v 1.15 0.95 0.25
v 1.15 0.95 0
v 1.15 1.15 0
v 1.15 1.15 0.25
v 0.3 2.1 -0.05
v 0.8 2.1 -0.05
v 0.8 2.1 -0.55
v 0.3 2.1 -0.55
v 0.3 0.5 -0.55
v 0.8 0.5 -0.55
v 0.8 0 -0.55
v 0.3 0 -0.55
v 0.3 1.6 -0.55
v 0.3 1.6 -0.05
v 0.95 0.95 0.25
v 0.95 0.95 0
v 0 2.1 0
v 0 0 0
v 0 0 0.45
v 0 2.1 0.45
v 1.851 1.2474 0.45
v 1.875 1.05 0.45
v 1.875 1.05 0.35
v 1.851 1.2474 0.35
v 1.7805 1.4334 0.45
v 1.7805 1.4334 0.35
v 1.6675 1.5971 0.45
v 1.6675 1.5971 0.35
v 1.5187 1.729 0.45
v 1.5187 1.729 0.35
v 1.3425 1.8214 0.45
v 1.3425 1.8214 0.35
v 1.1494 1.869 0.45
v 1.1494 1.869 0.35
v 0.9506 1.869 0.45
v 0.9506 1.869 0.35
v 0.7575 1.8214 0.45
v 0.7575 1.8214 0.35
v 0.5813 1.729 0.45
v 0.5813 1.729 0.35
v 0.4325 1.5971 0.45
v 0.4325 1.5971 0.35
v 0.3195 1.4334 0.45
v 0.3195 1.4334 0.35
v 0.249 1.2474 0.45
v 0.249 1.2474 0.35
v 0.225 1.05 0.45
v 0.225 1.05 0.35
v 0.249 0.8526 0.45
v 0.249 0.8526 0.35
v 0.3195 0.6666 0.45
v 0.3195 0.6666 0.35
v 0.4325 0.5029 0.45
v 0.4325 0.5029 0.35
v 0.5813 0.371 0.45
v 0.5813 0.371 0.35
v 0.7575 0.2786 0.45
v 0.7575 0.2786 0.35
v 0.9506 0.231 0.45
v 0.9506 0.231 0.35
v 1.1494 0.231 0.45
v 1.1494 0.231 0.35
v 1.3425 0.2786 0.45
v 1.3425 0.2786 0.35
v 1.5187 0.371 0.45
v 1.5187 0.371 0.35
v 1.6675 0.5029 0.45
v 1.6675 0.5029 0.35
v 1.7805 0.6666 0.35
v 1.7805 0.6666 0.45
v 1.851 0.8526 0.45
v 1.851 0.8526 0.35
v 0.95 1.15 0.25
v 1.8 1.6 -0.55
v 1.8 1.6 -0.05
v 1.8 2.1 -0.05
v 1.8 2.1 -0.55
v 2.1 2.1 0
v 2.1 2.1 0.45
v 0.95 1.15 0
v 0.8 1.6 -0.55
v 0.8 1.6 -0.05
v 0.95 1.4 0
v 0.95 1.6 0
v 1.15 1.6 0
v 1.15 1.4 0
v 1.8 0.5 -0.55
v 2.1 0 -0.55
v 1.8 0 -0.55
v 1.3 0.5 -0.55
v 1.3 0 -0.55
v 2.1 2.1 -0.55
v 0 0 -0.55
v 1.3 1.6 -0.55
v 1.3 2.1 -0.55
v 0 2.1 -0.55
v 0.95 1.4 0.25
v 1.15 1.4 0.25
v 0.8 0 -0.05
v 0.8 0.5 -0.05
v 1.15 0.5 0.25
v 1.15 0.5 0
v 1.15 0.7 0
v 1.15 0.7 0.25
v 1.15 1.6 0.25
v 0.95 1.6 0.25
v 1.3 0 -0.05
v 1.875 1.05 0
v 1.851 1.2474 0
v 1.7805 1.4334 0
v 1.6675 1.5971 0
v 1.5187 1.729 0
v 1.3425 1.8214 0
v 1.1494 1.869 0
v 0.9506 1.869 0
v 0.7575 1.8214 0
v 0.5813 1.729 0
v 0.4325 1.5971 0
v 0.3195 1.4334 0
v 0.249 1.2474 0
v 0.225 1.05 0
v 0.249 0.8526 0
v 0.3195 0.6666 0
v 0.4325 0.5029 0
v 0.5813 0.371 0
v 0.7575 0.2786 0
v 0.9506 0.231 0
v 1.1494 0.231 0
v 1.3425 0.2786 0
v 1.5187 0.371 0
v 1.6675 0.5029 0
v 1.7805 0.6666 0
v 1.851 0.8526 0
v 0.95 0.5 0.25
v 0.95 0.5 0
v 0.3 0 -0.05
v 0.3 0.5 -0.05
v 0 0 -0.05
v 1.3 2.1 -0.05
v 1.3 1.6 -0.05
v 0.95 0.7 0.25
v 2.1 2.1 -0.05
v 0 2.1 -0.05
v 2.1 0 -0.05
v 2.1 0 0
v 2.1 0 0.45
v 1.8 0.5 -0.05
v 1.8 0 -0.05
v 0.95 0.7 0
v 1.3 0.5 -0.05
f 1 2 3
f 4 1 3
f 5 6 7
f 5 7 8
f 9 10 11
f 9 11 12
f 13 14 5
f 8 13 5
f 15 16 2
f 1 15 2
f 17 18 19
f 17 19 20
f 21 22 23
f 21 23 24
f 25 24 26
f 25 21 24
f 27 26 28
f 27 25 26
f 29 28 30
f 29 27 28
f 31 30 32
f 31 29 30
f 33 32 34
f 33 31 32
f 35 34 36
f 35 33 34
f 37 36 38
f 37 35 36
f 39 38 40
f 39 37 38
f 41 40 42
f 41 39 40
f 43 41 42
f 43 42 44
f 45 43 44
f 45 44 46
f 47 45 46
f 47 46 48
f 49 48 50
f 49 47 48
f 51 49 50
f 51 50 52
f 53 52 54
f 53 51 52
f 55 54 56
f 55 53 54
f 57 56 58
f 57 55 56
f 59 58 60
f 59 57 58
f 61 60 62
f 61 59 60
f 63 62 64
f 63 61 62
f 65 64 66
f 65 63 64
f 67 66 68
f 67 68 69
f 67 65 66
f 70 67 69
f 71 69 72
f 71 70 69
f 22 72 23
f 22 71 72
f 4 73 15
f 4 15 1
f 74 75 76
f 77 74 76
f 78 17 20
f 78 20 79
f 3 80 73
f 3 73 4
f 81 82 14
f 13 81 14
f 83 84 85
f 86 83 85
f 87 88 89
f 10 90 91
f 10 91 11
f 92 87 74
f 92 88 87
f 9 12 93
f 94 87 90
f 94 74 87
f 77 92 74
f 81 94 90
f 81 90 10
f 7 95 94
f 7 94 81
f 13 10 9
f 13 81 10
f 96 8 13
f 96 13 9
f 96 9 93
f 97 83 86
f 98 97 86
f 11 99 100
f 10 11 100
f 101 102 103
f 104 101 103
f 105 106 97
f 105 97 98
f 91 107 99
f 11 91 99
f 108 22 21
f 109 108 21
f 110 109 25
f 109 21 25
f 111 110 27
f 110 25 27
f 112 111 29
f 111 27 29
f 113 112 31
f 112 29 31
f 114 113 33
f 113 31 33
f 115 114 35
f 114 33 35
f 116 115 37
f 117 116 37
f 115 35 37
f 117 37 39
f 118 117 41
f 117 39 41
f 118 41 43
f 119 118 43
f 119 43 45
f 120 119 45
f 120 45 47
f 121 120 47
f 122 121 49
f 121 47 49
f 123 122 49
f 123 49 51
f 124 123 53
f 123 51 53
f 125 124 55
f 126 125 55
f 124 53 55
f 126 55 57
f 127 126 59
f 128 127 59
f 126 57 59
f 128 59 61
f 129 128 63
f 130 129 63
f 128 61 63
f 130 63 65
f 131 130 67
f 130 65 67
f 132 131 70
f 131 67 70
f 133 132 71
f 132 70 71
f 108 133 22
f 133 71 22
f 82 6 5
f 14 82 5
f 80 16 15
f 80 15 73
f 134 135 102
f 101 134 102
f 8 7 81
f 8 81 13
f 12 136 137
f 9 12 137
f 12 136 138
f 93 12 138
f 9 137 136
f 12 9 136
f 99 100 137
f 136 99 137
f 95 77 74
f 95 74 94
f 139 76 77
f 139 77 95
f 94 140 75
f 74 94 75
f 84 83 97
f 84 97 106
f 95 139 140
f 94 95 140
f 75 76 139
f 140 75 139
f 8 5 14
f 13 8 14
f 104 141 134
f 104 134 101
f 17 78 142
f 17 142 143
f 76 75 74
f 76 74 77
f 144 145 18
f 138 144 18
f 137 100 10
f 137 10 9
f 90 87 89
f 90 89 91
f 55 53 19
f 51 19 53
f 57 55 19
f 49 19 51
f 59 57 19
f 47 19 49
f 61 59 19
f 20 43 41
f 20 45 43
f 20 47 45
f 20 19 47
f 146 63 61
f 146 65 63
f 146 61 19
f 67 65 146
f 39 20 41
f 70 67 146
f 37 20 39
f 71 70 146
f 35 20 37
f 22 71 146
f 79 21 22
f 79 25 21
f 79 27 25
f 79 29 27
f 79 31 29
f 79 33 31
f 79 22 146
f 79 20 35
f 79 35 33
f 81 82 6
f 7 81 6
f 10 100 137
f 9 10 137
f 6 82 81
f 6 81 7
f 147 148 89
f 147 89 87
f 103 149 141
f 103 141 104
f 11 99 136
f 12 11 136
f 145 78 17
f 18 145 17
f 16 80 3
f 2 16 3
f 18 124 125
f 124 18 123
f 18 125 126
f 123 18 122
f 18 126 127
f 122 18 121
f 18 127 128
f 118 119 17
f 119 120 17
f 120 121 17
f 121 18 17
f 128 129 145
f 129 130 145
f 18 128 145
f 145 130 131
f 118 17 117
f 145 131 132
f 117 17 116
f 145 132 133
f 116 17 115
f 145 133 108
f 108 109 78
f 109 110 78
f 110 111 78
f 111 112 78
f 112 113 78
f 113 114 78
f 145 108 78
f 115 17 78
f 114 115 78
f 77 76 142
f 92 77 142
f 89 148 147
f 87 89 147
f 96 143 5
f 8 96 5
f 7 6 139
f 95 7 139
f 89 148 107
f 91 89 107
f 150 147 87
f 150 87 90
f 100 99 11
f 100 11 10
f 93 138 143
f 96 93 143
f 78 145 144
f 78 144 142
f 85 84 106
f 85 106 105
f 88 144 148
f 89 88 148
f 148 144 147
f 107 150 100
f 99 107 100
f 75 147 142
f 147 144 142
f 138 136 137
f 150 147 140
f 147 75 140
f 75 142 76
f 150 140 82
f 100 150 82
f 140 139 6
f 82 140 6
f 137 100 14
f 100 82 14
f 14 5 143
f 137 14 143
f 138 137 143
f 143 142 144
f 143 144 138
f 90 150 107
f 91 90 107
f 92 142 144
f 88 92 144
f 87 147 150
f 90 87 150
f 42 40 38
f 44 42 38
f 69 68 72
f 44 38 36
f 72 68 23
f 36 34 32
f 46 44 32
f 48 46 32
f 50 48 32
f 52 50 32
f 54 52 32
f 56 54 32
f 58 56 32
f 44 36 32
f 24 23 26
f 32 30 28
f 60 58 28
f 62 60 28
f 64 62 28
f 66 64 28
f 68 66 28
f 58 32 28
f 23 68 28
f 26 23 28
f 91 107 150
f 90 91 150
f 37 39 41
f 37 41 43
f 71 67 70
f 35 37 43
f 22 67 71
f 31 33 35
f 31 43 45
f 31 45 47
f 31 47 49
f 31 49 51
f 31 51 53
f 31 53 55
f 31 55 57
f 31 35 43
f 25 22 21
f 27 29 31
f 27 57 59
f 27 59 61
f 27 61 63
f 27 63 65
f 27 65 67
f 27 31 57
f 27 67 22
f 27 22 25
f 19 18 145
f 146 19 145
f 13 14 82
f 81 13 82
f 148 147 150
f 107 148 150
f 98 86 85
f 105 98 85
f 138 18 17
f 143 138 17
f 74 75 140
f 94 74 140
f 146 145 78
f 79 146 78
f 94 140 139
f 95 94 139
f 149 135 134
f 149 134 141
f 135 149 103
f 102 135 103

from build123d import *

# Parameters (mm, degrees)
SKETCH1_W             = 2.1
SKETCH1_H             = 2.1
BOSS_EXTRUDE1_DEPTH   = 0.45
SKETCH2_W             = 2.1
SKETCH2_H             = 2.1
BOSS_EXTRUDE2_DEPTH   = 0.05
SKETCH3_W             = 0.5
SKETCH3_H             = 0.5
BOSS_EXTRUDE3_DEPTH   = 0.5
BOSS_EXTRUDE3_2_DEPTH = 0.5
BOSS_EXTRUDE3_3_DEPTH = 0.5
BOSS_EXTRUDE3_4_DEPTH = 0.5
BOSS_EXTRUDE5_DEPTH   = 0.5
SKETCH5_R             = 0.825
CUT_EXTRUDE1_DEPTH    = 0.45
SKETCH6_W             = 0.2
SKETCH6_H             = 0.2
BOSS_EXTRUDE6_DEPTH   = 0.25
BOSS_EXTRUDE6_2_DEPTH = 0.25
BOSS_EXTRUDE6_3_DEPTH = 0.25
SKETCH7_R             = 0.825
BOSS_EXTRUDE7_DEPTH   = 0.1


with BuildPart() as part:
    # Sketch1 → Boss-Extrude1 (new body)
    with BuildSketch(Plane.XY):
        with Locations((1.05, 1.05)):
            Rectangle(SKETCH1_W, SKETCH1_H)
    extrude(amount=BOSS_EXTRUDE1_DEPTH)

    # Sketch5 → Cut-Extrude1 (cut)
    with BuildSketch(Plane.XY.offset(0.45)):
        with Locations((1.05, 1.05)):
            Circle(SKETCH5_R)
    extrude(amount=-CUT_EXTRUDE1_DEPTH, mode=Mode.SUBTRACT)


with BuildPart() as body_2:
    # Sketch2 → Boss-Extrude2 (new body)
    with BuildSketch(Plane(origin=(0, 0, 0), x_dir=(-1, 0, 0), z_dir=(0, 0, -1))):
        with Locations((-1.05, 1.05)):
            Rectangle(SKETCH2_W, SKETCH2_H)
    extrude(amount=BOSS_EXTRUDE2_DEPTH)


with BuildPart() as body_3:
    # Sketch3 → Boss-Extrude3 (new body)
    with BuildSketch(Plane(origin=(0, 0, -0.05), x_dir=(-1, 0, 0), z_dir=(0, 0, -1))):
        with Locations((-0.55, 1.85)):
            Rectangle(SKETCH3_W, SKETCH3_H)
    extrude(amount=BOSS_EXTRUDE3_DEPTH)


with BuildPart() as body_4:
    # Sketch3 → Boss-Extrude3 2 (new body)
    with BuildSketch(Plane(origin=(0, 0, -0.05), x_dir=(-1, 0, 0), z_dir=(0, 0, -1))):
        with Locations((-1.55, 1.85)):
            Rectangle(SKETCH3_W, SKETCH3_H)
    extrude(amount=BOSS_EXTRUDE3_2_DEPTH)


with BuildPart() as body_5:
    # Sketch3 → Boss-Extrude3 3 (new body)
    with BuildSketch(Plane(origin=(0, 0, -0.05), x_dir=(-1, 0, 0), z_dir=(0, 0, -1))):
        with Locations((-1.55, 0.25)):
            Rectangle(SKETCH3_W, SKETCH3_H)
    extrude(amount=BOSS_EXTRUDE3_3_DEPTH)


with BuildPart() as body_6:
    # Sketch3 → Boss-Extrude3 4 (new body)
    with BuildSketch(Plane(origin=(0, 0, -0.05), x_dir=(-1, 0, 0), z_dir=(0, 0, -1))):
        with Locations((-0.55, 0.25)):
            Rectangle(SKETCH3_W, SKETCH3_H)
    extrude(amount=BOSS_EXTRUDE3_4_DEPTH)


with BuildPart() as body_7:
    # Sketch4 → Boss-Extrude5 (new body)
    with BuildSketch(Plane(origin=(0, 0, -0.05), x_dir=(-1, 0, 0), z_dir=(0, 0, -1))):
        Polygon((-2.1, 2.1), (-2.1, 0), (-1.8, 0), (-1.8, 0.5), (-1.3, 0.5), (-1.3, 0), (-0.8, 0), (-0.8, 0.5), (-0.3, 0.5), (-0.3, 0), (0, 0), (0, 2.1), (-0.3, 2.1), (-0.3, 1.6), (-0.8, 1.6), (-0.8, 2.1), (-1.3, 2.1), (-1.3, 1.6), (-1.8, 1.6), (-1.8, 2.1), align=None)
    extrude(amount=BOSS_EXTRUDE5_DEPTH)


with BuildPart() as body_8:
    # Sketch6 → Boss-Extrude6 (new body)
    with BuildSketch(Plane.XY):
        with Locations((1.05, 1.5)):
            Rectangle(SKETCH6_W, SKETCH6_H)
    extrude(amount=BOSS_EXTRUDE6_DEPTH)


with BuildPart() as body_9:
    # Sketch6 → Boss-Extrude6 2 (new body)
    with BuildSketch(Plane.XY):
        with Locations((1.05, 1.05)):
            Rectangle(SKETCH6_W, SKETCH6_H)
    extrude(amount=BOSS_EXTRUDE6_2_DEPTH)


with BuildPart() as body_10:
    # Sketch6 → Boss-Extrude6 3 (new body)
    with BuildSketch(Plane.XY):
        with Locations((1.05, 0.6)):
            Rectangle(SKETCH6_W, SKETCH6_H)
    extrude(amount=BOSS_EXTRUDE6_3_DEPTH)


with BuildPart() as body_11:
    # Sketch7 → Boss-Extrude7 (new body)
    with BuildSketch(Plane.XY.offset(0.45)):
        with Locations((1.05, 1.05)):
            Circle(SKETCH7_R)
    extrude(amount=-BOSS_EXTRUDE7_DEPTH)


solid = Compound([part.part, body_2.part, body_3.part, body_4.part, body_5.part, body_6.part, body_7.part, body_8.part, body_9.part, body_10.part, body_11.part])
